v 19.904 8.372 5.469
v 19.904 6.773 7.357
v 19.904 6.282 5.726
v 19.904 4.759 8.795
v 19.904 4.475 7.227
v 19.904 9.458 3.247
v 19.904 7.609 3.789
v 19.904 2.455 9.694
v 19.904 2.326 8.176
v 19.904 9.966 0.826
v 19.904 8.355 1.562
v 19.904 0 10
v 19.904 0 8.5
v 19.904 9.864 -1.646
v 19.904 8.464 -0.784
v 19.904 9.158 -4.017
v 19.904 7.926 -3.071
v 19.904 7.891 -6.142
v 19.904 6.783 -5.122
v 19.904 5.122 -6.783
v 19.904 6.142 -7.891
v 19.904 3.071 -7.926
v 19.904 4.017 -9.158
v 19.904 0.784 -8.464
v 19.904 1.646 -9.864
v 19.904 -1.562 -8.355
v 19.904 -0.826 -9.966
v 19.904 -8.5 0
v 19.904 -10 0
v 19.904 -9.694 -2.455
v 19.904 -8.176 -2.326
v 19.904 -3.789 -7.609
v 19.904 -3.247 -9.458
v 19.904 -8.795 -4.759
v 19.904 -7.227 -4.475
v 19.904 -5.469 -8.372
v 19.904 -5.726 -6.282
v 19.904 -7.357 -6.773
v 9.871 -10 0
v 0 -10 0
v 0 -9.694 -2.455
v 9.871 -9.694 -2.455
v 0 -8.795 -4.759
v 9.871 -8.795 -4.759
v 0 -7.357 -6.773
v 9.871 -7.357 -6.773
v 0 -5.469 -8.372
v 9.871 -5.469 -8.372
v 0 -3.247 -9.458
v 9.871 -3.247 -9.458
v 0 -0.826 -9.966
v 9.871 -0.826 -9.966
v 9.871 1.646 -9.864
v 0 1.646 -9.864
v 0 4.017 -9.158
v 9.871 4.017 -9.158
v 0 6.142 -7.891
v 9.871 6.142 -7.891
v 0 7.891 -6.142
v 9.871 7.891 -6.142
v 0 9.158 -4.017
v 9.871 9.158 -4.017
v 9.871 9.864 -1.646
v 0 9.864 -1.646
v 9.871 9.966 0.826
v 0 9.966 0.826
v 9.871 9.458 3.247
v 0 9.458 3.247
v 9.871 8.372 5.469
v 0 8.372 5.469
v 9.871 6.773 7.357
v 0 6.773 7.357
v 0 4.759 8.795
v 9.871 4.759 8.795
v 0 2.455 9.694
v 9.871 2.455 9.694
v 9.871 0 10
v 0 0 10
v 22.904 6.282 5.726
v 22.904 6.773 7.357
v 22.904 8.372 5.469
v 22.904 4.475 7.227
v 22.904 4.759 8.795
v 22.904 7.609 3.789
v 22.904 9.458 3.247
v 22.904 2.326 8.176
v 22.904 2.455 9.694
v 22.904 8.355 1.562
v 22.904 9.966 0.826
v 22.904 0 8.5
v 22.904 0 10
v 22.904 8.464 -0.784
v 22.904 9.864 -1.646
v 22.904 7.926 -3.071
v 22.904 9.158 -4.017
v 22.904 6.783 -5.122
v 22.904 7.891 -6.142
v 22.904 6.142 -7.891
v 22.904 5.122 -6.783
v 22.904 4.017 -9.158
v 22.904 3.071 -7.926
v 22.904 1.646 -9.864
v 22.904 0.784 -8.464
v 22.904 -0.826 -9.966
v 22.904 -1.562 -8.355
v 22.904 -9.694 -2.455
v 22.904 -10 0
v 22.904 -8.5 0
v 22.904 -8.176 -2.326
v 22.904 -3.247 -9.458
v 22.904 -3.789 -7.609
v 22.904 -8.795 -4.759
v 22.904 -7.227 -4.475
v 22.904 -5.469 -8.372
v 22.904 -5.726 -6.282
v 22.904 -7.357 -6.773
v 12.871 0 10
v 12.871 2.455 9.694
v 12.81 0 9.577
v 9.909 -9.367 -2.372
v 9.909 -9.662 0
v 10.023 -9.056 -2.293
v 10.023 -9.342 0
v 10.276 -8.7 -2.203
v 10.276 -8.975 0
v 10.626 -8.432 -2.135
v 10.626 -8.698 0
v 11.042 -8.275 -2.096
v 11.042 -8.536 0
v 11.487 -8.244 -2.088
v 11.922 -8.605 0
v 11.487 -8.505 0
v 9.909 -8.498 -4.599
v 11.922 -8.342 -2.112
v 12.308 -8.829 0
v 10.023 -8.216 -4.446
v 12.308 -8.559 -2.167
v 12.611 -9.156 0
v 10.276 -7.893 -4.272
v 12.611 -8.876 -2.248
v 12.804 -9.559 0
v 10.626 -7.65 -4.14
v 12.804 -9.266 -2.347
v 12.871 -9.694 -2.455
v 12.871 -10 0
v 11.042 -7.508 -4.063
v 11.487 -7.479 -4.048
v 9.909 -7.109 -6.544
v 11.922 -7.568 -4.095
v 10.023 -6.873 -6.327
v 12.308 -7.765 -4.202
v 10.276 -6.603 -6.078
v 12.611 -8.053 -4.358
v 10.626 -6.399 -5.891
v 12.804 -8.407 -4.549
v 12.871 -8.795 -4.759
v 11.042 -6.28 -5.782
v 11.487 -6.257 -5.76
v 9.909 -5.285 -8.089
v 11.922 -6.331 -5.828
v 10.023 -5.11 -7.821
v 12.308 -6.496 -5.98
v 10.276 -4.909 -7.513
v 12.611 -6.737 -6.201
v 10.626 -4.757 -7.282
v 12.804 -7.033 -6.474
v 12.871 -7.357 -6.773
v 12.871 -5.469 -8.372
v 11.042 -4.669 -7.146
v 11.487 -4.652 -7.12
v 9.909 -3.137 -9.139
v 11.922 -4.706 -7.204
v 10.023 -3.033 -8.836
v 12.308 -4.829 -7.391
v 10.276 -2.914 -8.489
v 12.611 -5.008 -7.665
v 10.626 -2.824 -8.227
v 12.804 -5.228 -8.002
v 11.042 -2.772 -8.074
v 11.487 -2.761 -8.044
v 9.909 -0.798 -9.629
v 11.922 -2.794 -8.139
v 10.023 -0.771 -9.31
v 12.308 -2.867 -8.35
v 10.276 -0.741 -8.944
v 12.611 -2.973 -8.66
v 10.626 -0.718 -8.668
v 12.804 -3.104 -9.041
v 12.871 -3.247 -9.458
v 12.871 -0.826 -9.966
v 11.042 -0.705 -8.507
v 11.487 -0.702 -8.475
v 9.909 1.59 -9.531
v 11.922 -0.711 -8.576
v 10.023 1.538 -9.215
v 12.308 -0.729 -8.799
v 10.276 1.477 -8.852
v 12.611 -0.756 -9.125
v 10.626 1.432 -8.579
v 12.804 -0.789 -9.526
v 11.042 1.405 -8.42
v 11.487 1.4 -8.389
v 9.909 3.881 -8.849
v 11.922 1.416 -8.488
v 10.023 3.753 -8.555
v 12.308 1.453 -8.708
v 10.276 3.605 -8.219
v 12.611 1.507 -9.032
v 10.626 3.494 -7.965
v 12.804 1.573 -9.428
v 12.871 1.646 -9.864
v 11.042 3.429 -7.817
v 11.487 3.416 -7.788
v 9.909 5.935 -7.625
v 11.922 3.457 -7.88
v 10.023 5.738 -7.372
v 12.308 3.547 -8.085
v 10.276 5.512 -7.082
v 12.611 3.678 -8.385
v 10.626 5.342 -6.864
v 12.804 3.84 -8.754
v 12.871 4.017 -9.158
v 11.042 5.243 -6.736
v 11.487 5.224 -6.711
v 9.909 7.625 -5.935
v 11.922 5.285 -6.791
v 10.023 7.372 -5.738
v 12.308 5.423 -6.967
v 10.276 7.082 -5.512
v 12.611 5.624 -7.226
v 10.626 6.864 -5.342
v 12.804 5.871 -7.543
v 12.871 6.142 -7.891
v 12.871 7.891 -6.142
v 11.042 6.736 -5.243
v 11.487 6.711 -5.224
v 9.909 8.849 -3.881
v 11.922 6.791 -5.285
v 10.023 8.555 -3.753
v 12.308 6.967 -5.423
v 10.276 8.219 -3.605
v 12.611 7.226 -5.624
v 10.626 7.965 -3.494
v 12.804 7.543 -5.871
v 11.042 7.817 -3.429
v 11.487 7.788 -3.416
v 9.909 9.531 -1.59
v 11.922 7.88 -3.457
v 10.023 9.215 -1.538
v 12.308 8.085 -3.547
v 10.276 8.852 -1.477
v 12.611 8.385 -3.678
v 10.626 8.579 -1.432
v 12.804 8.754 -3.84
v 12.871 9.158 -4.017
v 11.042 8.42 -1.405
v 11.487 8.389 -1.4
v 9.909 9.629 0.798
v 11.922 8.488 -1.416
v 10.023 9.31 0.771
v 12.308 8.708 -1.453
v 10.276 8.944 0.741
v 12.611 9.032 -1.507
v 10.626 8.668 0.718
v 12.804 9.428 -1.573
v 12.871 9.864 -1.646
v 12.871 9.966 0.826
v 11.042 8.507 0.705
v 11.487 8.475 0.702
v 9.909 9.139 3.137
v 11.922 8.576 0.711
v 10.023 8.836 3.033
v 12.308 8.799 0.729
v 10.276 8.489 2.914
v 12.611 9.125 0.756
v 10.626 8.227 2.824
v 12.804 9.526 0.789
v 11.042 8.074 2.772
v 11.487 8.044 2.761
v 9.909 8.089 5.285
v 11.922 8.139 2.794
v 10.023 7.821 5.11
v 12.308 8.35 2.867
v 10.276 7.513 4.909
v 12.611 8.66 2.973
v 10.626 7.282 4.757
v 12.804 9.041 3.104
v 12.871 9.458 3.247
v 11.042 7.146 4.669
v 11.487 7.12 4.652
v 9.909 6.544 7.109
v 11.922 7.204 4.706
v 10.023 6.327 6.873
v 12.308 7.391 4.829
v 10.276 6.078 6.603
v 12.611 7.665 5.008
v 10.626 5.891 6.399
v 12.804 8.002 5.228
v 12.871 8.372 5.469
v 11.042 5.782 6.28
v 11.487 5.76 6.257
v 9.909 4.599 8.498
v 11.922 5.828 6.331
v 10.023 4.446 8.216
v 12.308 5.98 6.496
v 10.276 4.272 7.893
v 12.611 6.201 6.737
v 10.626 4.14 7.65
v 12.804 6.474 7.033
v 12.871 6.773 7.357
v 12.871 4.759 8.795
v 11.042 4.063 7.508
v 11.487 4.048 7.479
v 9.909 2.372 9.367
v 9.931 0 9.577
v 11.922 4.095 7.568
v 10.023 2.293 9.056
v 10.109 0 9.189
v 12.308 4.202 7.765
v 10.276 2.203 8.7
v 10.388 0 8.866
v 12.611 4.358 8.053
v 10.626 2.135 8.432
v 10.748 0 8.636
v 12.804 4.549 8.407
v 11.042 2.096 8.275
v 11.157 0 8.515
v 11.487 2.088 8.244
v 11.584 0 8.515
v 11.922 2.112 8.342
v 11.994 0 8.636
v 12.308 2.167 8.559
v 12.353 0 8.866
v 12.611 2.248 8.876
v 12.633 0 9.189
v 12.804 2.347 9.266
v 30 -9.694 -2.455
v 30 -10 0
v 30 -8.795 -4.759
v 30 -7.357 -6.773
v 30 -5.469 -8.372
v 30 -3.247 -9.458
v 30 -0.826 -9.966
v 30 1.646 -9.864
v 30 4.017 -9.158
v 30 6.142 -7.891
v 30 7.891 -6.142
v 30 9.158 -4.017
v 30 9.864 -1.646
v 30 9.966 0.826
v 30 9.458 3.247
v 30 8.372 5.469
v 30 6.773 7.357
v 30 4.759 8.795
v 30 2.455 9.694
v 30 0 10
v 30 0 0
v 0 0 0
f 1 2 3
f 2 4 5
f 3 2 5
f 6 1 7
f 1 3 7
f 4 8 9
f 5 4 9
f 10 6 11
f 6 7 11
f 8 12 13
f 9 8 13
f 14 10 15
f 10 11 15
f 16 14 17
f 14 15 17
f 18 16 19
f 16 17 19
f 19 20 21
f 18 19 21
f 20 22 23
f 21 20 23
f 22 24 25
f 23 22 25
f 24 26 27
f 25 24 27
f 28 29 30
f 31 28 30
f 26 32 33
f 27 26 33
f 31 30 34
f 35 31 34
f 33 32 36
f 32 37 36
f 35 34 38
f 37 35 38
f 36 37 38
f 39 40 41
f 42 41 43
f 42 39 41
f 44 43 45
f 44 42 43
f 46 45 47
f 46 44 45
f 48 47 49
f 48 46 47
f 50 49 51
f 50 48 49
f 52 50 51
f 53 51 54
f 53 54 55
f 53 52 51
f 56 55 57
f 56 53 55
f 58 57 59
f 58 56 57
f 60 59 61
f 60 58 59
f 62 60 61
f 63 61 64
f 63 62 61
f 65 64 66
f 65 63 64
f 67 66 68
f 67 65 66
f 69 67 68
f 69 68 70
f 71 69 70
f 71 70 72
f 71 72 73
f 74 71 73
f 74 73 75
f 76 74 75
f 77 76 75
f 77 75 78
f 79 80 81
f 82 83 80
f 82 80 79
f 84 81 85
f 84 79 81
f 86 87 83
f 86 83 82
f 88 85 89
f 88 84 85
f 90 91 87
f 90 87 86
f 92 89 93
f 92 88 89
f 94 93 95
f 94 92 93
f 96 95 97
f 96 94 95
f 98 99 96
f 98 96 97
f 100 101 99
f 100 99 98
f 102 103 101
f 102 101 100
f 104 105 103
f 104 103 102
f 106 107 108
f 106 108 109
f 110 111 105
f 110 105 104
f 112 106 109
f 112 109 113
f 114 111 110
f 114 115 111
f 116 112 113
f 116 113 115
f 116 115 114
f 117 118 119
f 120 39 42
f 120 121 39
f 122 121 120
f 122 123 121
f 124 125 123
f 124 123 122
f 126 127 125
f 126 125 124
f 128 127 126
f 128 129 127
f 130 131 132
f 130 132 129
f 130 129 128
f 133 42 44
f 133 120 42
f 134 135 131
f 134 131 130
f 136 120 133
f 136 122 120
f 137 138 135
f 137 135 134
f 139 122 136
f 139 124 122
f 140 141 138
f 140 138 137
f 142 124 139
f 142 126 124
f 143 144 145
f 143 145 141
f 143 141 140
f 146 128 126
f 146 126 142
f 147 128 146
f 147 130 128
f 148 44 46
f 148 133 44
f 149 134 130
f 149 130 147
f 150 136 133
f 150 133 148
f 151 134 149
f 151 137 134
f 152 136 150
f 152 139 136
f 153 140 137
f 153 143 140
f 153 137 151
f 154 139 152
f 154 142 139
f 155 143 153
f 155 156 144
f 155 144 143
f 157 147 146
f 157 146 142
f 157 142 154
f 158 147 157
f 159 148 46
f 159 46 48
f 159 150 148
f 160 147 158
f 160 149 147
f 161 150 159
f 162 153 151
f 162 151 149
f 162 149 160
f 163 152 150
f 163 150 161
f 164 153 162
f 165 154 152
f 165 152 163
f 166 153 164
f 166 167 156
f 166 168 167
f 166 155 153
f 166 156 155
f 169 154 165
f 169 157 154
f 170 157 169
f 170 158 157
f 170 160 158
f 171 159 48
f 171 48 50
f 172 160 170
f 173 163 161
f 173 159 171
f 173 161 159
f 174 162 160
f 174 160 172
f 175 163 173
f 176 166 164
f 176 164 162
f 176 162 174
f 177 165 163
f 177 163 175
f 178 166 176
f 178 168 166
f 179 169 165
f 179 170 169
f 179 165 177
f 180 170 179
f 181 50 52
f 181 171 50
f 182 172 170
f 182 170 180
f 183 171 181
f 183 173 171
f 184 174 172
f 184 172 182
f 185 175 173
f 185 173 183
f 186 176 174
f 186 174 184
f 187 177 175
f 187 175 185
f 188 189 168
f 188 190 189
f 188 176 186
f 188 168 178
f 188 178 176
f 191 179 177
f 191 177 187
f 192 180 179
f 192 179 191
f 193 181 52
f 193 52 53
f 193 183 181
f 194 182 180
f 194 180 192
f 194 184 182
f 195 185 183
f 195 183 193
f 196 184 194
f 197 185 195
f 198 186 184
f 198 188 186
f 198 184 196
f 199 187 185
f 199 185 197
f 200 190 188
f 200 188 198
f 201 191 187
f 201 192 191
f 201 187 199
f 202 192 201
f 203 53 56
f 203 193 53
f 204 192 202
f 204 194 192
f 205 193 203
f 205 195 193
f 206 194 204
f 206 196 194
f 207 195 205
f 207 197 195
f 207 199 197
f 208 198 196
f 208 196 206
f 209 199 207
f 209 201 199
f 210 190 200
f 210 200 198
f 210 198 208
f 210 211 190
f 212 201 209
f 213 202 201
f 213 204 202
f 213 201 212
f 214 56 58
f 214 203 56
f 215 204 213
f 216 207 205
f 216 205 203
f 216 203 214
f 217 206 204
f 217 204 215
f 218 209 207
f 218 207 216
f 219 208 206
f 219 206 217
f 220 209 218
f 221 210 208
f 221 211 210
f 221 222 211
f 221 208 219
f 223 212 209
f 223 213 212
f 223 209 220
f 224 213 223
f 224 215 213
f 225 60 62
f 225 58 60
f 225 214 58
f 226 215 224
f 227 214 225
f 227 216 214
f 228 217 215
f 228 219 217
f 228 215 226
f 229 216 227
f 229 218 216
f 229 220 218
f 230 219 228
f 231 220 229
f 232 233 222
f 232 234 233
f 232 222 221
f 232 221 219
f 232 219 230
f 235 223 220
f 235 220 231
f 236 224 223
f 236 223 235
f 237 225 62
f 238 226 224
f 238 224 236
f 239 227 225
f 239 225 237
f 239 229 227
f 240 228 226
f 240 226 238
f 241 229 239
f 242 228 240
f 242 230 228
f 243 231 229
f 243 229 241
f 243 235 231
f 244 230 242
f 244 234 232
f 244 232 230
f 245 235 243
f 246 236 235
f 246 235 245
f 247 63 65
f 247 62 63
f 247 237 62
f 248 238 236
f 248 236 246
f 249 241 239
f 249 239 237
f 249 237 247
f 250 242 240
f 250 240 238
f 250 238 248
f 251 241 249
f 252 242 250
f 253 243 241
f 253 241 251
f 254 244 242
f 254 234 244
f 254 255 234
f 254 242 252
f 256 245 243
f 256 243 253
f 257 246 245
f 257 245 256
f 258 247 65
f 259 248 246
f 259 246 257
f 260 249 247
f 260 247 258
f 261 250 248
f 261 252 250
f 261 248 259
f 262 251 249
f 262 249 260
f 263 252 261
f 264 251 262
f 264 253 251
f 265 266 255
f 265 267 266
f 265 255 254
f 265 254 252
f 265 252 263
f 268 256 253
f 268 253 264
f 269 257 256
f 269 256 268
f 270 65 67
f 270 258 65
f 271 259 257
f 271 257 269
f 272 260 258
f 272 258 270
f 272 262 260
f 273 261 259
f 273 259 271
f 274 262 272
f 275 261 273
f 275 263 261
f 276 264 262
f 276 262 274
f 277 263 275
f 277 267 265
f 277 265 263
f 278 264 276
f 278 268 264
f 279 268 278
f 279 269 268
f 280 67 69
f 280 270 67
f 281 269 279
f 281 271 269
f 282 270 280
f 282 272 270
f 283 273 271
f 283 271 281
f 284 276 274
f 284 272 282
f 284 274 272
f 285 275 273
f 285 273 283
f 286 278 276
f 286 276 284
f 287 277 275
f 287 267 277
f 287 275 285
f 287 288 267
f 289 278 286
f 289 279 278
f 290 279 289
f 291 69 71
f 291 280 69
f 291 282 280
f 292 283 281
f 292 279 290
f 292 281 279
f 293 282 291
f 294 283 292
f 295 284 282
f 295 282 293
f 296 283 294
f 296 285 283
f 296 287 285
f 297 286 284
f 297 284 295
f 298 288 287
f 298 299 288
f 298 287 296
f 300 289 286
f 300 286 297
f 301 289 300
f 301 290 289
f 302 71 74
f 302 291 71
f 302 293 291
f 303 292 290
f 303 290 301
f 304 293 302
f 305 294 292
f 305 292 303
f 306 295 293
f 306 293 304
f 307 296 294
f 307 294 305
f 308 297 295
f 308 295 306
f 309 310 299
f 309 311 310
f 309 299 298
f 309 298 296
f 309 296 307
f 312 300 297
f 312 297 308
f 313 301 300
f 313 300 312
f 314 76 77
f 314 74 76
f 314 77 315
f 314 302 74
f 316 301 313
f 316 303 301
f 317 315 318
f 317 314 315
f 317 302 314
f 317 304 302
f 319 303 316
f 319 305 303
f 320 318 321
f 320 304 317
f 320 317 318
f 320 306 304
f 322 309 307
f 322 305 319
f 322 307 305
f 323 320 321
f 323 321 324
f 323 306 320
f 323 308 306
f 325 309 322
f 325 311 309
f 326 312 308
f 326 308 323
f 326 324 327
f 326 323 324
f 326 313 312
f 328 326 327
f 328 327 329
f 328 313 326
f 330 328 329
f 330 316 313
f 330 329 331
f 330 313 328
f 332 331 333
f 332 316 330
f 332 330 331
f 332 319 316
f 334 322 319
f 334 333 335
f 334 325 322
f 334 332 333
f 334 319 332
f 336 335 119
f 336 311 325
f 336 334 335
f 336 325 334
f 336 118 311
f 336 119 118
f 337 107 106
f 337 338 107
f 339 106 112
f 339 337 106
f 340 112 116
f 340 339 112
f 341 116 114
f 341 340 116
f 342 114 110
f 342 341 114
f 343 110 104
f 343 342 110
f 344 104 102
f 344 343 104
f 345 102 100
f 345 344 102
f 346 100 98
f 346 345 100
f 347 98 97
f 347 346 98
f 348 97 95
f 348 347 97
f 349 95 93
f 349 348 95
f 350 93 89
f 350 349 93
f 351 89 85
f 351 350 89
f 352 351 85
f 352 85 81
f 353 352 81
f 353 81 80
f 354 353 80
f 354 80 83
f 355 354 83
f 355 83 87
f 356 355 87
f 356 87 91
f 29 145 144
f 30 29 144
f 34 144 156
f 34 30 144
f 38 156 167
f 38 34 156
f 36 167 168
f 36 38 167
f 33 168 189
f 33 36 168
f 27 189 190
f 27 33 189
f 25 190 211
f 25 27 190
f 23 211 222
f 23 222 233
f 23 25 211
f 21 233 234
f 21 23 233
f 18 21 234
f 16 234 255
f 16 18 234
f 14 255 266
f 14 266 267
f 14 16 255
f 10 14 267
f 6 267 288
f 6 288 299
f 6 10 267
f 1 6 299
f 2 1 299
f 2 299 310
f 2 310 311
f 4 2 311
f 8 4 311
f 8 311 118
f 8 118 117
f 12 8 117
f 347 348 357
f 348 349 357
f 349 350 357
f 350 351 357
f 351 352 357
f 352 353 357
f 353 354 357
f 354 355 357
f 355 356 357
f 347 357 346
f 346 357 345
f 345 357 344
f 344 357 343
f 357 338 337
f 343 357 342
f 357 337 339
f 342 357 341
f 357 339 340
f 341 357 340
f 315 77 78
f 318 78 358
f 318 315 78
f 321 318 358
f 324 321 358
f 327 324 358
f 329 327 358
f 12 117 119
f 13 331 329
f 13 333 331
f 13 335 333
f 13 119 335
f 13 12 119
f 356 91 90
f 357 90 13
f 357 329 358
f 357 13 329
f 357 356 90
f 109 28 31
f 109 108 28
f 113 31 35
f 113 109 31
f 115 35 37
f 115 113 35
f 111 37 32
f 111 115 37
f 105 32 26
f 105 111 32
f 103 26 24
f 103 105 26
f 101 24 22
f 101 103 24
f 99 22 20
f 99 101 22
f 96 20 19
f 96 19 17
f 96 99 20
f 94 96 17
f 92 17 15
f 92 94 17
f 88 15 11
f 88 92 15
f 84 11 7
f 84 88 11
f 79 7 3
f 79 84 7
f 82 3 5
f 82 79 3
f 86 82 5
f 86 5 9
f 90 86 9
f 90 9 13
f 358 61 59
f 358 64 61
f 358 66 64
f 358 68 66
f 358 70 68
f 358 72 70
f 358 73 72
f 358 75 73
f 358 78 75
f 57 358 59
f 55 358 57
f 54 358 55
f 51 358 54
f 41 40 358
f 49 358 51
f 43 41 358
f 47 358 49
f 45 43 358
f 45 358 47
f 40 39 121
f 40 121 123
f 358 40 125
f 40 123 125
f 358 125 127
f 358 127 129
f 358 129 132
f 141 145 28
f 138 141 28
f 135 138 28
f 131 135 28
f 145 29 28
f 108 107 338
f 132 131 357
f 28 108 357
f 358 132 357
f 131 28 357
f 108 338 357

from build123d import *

# Parameters (mm, degrees)
ESQUISSE1_W             = 30
ESQUISSE1_H             = 10
ESQUISSE4_R             = 1.5
ESQUISSE4_W             = 3
ESQUISSE4_H             = 2.501285573
ESQUISSE5_W             = 24.738109029
ESQUISSE5_H             = 14.721675616
ENL_V_MAT_EXTRU_2_DEPTH = 34.166247904


with BuildPart() as part:
    # Esquisse1 → Révolution2 (revolve)
    with BuildSketch(Plane.XY, mode=Mode.PRIVATE) as r_volution2_sk:
        with Locations((15, 5)):
            Rectangle(ESQUISSE1_W, ESQUISSE1_H)
    revolve(r_volution2_sk.sketch.rotate(Axis((0, 0, 0), (1, 0, 0)), 90), axis=Axis((0, 0, 0), (1, 0, 0)))

    # Esquisse4 → Enlèvement de matière-Révolution1 (revolve, cut)
    with BuildSketch(Plane(origin=(0, 0, 0), x_dir=(1, 0, 0), z_dir=(0, 1, 0)), mode=Mode.PRIVATE) as enl_vement_de_mati_re_r_volution1_sk:
        with Locations((11.370683678, 10)):
            Circle(ESQUISSE4_R)
        with Locations((21.404481516, 9.750642787)):
            Rectangle(ESQUISSE4_W, ESQUISSE4_H)
    revolve(enl_vement_de_mati_re_r_volution1_sk.sketch.rotate(Axis((0, 0, 0), (1, 0, 0)), 180), axis=Axis((0, 0, 0), (1, 0, 0)), mode=Mode.SUBTRACT)

    # Esquisse5 → Enlèv. mat.-Extru.2 (cut, through all)
    with BuildSketch(Plane(origin=(30, 0, 0), x_dir=(0, 0, -1), z_dir=(1, 0, 0))):
        with Locations((-12.369054515, -7.360837808)):
            Rectangle(ESQUISSE5_W, ESQUISSE5_H)
    extrude(amount=-ENL_V_MAT_EXTRU_2_DEPTH, mode=Mode.SUBTRACT)


solid = part.part
